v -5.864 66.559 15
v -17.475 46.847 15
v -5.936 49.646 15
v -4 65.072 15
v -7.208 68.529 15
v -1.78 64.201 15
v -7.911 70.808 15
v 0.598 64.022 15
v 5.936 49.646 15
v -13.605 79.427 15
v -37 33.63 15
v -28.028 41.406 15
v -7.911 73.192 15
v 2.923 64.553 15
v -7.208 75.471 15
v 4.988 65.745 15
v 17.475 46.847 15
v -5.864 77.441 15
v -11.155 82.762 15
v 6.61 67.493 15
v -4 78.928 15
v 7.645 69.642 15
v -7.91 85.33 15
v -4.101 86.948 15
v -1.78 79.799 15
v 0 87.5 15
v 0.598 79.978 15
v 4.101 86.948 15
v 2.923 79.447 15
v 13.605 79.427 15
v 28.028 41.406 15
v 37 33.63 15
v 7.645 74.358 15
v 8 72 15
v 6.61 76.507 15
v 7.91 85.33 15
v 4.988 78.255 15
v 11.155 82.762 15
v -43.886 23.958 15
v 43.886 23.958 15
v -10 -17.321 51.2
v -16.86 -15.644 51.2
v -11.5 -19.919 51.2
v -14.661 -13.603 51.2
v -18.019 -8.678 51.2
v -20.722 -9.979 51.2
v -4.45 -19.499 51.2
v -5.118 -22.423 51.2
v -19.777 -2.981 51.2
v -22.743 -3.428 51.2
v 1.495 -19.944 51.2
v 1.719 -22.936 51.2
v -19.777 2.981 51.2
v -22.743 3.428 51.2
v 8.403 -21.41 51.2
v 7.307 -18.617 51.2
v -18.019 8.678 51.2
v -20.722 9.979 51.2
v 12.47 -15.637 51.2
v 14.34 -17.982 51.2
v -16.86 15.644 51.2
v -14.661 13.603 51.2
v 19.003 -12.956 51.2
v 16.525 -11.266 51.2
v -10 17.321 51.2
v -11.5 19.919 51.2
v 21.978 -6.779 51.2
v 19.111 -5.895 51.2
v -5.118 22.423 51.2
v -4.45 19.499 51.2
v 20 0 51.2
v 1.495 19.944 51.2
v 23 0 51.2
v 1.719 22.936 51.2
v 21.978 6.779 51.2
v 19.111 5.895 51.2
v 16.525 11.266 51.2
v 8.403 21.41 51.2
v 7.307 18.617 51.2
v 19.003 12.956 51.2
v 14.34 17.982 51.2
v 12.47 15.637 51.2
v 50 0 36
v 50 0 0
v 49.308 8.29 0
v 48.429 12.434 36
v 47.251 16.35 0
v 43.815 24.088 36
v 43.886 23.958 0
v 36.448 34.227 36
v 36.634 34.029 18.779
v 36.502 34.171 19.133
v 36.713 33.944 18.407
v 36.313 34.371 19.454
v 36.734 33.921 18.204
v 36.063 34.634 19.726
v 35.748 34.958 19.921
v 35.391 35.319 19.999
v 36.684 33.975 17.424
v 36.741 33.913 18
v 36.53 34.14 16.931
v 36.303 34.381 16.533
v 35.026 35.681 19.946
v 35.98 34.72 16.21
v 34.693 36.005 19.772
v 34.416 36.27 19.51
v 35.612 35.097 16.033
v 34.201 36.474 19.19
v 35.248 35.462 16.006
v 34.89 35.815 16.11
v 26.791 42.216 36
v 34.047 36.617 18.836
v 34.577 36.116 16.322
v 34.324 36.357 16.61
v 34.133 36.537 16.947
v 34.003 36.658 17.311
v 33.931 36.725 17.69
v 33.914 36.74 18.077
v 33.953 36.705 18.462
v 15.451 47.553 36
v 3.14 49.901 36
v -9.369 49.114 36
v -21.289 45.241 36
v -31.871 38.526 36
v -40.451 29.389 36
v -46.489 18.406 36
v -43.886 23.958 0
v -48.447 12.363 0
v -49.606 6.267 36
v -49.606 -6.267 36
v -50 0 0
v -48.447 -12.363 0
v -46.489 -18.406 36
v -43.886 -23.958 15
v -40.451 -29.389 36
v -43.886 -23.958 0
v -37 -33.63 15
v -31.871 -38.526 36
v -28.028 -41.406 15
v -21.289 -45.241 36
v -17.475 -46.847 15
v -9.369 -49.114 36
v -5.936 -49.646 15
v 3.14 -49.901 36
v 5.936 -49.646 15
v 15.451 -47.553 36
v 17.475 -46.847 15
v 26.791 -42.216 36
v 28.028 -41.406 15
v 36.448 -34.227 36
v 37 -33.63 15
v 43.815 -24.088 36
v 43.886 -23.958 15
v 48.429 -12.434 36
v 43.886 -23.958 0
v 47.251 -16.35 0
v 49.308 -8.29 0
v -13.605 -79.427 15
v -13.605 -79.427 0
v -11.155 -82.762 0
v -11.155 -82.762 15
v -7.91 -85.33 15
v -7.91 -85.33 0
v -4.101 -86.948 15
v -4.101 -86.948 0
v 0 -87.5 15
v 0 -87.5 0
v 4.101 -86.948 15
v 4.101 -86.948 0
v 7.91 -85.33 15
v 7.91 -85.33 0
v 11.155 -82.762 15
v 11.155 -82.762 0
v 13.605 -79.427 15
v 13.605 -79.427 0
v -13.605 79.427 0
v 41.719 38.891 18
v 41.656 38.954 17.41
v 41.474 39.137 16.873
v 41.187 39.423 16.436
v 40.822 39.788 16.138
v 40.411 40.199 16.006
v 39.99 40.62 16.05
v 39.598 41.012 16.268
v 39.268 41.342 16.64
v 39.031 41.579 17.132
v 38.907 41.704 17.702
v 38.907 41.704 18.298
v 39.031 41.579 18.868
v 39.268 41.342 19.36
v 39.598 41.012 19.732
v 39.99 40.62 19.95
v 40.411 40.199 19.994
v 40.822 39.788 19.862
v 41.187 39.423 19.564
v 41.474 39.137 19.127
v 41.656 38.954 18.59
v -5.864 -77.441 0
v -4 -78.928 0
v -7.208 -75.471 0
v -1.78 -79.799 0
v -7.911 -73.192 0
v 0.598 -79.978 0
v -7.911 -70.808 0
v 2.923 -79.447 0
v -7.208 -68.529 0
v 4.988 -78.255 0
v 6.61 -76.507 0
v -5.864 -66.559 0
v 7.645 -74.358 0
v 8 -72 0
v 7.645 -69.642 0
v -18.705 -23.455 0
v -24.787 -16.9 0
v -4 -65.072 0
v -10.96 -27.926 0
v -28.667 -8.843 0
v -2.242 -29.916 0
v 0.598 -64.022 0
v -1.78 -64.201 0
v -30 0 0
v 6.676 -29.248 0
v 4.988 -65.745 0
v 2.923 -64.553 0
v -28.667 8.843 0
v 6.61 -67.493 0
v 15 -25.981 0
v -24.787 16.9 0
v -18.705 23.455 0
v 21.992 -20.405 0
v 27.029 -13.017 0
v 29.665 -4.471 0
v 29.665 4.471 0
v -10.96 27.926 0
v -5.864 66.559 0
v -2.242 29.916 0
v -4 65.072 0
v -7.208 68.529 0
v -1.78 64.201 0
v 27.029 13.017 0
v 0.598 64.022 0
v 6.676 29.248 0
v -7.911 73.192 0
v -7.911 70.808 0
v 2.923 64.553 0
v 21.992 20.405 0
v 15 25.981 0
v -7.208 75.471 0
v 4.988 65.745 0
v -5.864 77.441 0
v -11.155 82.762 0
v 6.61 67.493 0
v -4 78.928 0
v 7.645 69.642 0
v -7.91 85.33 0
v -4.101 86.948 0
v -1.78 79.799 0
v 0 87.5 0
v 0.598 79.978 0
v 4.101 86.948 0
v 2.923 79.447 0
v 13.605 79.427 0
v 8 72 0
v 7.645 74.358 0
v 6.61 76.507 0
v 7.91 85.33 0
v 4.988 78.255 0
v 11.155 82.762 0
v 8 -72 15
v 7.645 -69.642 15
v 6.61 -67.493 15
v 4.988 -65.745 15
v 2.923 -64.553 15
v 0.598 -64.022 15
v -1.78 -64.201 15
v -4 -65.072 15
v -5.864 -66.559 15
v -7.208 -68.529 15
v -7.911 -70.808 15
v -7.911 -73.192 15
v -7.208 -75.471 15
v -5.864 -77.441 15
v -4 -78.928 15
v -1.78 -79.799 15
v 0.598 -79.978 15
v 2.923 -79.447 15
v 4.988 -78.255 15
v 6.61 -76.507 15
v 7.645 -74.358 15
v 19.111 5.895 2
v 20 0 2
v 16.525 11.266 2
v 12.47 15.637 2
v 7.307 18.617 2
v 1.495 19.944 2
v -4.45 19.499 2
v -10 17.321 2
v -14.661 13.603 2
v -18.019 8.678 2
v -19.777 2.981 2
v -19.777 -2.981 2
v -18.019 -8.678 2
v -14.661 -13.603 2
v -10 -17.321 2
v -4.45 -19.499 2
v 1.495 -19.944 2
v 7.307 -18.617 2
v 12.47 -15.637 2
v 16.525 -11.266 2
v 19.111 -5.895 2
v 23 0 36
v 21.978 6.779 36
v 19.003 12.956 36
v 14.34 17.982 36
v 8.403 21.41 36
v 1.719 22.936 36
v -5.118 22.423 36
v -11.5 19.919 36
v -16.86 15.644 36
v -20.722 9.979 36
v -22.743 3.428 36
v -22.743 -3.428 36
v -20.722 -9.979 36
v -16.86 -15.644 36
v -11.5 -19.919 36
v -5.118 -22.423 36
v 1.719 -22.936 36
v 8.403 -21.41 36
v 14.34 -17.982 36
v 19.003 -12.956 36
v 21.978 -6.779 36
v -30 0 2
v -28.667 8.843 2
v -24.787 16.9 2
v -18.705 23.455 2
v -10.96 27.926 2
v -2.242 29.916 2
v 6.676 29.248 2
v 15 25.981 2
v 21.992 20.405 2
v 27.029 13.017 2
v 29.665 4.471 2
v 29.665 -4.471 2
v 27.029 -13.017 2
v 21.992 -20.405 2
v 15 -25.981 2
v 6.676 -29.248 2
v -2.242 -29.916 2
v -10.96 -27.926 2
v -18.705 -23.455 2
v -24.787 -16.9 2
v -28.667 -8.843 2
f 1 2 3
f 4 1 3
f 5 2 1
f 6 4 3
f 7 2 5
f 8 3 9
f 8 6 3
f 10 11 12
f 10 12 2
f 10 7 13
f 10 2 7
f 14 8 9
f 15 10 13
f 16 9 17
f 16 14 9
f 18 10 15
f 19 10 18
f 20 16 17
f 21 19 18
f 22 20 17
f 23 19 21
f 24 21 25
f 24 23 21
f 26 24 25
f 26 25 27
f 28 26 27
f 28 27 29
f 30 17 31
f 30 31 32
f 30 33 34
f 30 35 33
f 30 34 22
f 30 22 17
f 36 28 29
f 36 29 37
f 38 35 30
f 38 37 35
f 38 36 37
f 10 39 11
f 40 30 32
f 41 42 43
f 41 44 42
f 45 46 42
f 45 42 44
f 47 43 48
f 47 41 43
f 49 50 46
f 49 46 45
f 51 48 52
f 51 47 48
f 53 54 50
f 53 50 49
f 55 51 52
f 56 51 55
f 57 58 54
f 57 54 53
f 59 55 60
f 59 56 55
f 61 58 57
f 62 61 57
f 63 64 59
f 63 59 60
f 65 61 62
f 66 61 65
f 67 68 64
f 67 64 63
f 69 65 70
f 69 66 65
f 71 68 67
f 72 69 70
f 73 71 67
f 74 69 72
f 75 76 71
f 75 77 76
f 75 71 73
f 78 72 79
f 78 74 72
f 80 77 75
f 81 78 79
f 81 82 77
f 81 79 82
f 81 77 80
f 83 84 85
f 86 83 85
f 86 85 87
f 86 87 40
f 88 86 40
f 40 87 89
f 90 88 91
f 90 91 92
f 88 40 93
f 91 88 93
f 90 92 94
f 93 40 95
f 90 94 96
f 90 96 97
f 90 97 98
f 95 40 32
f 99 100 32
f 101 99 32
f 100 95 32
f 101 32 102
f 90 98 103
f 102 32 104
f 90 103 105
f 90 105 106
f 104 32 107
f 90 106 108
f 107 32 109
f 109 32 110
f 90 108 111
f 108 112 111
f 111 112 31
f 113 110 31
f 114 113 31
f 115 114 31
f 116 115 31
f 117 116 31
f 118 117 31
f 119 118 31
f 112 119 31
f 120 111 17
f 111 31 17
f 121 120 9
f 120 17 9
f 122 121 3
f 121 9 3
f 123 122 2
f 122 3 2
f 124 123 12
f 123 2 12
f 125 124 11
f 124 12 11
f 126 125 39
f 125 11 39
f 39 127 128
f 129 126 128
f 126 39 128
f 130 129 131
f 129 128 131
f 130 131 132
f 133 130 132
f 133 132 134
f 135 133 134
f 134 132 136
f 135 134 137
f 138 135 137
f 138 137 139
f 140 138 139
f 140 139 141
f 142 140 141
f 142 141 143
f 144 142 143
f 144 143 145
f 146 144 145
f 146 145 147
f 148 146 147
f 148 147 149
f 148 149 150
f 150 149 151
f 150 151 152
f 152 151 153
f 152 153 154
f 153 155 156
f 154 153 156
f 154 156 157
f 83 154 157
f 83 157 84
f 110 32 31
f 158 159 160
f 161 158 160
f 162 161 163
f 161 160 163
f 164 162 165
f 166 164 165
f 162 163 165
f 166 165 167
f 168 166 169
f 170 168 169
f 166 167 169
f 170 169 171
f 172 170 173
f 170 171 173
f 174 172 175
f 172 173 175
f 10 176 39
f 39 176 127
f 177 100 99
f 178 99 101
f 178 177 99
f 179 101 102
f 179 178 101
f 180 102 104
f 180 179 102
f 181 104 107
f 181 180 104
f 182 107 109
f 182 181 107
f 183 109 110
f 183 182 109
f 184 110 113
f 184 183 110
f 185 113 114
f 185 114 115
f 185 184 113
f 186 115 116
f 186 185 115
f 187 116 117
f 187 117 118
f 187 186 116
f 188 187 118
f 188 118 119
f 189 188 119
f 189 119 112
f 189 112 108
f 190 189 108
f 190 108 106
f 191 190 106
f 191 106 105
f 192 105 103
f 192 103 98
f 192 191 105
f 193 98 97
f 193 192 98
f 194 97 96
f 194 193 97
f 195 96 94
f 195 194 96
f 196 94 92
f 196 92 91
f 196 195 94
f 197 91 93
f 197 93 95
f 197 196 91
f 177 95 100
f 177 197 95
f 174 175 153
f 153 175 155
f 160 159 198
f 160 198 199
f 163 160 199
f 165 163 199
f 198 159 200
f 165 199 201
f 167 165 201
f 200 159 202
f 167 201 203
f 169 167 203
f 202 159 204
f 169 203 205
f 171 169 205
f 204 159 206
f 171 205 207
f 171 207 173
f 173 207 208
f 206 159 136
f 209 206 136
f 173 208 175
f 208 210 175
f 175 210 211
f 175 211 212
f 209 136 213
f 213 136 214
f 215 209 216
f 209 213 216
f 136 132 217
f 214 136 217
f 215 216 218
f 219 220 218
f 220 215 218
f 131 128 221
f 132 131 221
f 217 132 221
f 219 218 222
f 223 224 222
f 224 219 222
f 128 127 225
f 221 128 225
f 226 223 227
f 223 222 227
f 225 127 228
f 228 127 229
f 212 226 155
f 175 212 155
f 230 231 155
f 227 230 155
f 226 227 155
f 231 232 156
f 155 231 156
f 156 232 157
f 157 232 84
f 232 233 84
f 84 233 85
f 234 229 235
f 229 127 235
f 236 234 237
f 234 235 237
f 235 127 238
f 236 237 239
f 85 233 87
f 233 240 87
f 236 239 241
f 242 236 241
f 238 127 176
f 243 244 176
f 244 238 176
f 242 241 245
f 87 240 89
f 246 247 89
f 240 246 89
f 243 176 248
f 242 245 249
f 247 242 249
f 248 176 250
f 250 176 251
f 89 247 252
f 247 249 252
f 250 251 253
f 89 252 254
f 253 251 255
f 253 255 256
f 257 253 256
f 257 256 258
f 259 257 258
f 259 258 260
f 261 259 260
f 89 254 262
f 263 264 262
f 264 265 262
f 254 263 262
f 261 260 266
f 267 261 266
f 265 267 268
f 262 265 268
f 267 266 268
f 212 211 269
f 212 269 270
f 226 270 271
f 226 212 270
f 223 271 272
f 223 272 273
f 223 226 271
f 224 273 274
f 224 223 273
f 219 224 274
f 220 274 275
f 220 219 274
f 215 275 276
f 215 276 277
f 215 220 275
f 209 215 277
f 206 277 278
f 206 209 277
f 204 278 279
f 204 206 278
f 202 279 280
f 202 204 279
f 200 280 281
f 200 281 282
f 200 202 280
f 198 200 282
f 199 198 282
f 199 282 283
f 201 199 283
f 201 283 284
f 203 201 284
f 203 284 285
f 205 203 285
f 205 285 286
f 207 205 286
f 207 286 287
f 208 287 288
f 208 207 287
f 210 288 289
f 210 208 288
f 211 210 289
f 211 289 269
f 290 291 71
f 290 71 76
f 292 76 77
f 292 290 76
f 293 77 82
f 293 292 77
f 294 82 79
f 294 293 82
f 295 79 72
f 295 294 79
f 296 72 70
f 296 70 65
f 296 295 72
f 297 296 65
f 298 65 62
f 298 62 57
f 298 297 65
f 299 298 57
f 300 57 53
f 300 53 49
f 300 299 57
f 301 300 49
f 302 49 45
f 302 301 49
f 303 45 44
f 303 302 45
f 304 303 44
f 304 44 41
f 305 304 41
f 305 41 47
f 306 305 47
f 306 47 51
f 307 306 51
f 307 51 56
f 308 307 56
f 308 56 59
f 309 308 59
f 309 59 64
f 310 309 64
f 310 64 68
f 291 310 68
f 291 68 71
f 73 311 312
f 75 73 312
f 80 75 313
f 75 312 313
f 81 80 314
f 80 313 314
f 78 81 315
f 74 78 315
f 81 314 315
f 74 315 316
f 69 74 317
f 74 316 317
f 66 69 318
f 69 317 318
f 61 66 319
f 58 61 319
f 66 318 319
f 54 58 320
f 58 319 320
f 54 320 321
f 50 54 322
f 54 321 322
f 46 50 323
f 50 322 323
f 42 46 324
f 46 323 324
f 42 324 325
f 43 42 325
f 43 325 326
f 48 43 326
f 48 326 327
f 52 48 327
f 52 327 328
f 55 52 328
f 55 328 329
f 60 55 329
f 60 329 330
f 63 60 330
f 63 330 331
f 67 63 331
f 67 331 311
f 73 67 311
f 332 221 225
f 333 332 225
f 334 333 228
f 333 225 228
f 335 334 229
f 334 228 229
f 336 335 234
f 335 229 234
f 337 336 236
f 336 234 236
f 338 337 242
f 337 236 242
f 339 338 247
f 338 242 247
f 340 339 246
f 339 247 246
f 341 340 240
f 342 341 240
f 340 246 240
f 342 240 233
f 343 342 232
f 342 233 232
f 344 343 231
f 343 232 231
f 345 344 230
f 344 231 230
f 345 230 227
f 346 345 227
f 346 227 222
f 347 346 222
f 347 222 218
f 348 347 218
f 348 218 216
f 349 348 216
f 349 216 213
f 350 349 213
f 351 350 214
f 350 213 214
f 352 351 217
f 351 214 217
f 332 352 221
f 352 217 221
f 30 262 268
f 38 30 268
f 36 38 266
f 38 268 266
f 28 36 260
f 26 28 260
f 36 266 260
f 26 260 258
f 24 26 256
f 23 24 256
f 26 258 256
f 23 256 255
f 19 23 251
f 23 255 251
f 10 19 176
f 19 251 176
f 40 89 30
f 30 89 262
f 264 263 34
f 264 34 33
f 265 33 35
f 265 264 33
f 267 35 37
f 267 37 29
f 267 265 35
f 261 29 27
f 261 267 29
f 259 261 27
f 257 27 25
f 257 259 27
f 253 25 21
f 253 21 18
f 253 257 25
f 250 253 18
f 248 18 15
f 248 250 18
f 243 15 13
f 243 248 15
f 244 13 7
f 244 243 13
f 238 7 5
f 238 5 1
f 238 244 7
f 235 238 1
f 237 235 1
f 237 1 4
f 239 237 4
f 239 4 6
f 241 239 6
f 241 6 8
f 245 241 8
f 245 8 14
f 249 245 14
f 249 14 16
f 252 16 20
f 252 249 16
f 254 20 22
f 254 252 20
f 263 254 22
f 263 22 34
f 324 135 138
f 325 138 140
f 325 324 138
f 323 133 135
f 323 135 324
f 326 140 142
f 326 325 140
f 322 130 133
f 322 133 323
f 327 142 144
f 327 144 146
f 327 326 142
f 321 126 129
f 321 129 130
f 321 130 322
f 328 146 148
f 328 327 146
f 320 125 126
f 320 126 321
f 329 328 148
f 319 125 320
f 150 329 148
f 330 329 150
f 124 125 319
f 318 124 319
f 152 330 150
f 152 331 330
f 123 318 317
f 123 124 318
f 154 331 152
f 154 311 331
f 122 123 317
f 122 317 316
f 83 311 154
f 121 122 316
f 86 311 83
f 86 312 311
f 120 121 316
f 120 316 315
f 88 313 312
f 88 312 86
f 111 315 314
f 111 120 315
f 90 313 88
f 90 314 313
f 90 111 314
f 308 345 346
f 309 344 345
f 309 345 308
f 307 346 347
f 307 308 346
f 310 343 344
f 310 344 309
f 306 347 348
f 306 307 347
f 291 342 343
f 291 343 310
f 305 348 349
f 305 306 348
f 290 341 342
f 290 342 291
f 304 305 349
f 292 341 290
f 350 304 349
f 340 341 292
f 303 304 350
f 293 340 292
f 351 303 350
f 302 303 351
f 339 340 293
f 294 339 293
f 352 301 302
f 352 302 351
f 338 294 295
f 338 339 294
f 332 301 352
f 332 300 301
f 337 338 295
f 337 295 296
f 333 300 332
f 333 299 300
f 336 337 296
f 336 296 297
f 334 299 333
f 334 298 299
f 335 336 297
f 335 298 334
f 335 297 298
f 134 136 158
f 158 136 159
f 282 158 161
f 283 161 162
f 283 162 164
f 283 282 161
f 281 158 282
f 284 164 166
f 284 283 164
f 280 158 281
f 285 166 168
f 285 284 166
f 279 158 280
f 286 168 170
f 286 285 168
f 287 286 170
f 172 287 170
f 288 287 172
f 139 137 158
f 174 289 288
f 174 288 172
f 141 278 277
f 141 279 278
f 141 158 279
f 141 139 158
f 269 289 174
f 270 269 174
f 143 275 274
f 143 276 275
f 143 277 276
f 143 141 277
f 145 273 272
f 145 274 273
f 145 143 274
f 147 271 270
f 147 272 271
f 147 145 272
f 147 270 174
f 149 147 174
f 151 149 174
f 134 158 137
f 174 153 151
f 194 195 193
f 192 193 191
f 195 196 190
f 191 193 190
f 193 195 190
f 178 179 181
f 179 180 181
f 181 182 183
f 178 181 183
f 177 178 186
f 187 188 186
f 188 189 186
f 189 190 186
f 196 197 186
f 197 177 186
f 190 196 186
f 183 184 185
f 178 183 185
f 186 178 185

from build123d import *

# Parameters (mm, degrees)
SKETCH_1_R          = 23
SKETCH_1_R_2        = 20
EXTRUDE_1_DEPTH     = 51.2
SKETCH_2_R          = 50
SKETCH_2_R_2        = 23
EXTRUDE_2_DEPTH     = 36
EXTRUDE_3_DEPTH     = 15
SKETCH_4_R          = 8
CUT_EXTRUDE_1_DEPTH = 15
SKETCH_5_W          = 2
SKETCH_5_H          = 10
SKETCH_6_R          = 30
CUT_EXTRUDE_2_DEPTH = 2


with BuildPart() as part:
    # 草图1 → 拉伸1 (new body)
    with BuildSketch(Plane.XY):
        Circle(SKETCH_1_R)
        Circle(SKETCH_1_R_2, mode=Mode.SUBTRACT)
    extrude(amount=EXTRUDE_1_DEPTH)

    # 草图2 → 拉伸2 (add)
    with BuildSketch(Plane.XY):
        Circle(SKETCH_2_R)
        Circle(SKETCH_2_R_2, mode=Mode.SUBTRACT)
    extrude(amount=EXTRUDE_2_DEPTH)

    # 草图3 → 拉伸3 (add)
    with BuildSketch(Plane.XY):
        with BuildLine():
            Line((-43.886196735, -23.958333333), (-13.604720988, -79.427083333))
            ThreePointArc((-13.604720988, -79.427083333), (0, -87.5), (13.604720988, -79.427083333))
            Line((13.604720988, -79.427083333), (43.886196735, -23.958333333))
            ThreePointArc((43.886196735, -23.958333333), (0, -50), (-43.886196735, -23.958333333))
        make_face()
        with BuildLine():
            Line((-13.604720988, 79.427083333), (-43.886196735, 23.958333333))
            ThreePointArc((-43.886196735, 23.958333333), (0, 50), (43.886196735, 23.958333333))
            Line((43.886196735, 23.958333333), (13.604720988, 79.427083333))
            ThreePointArc((13.604720988, 79.427083333), (0, 87.5), (-13.604720988, 79.427083333))
        make_face()
    extrude(amount=EXTRUDE_3_DEPTH)

    # 草图4 → 切除-拉伸1 (cut)
    with BuildSketch(Plane.XY):
        with Locations((0, 72)):
            Circle(SKETCH_4_R)
        with Locations((0, -72)):
            Circle(SKETCH_4_R)
    extrude(amount=CUT_EXTRUDE_1_DEPTH, mode=Mode.SUBTRACT)

    # 草图5 → 旋转1 (revolve)
    with BuildSketch(Plane(origin=(0, 0, 0), x_dir=(0, 0, 1), z_dir=(-0.7071067811865488, 0.7071067811865462, 0))):
        with Locations((19, 52)):
            Rectangle(SKETCH_5_W, SKETCH_5_H)
    revolve(axis=Axis((-701.140256875, -701.140256875, 18), (0.7071067811865462, 0.7071067811865489, 0)))

    # 草图6 → 切除-拉伸2 (cut)
    with BuildSketch(Plane(origin=(0, 0, 0), x_dir=(-1, 0, 0), z_dir=(0, 0, -1))):
        Circle(SKETCH_6_R)
    extrude(amount=-CUT_EXTRUDE_2_DEPTH, mode=Mode.SUBTRACT)


solid = part.part
